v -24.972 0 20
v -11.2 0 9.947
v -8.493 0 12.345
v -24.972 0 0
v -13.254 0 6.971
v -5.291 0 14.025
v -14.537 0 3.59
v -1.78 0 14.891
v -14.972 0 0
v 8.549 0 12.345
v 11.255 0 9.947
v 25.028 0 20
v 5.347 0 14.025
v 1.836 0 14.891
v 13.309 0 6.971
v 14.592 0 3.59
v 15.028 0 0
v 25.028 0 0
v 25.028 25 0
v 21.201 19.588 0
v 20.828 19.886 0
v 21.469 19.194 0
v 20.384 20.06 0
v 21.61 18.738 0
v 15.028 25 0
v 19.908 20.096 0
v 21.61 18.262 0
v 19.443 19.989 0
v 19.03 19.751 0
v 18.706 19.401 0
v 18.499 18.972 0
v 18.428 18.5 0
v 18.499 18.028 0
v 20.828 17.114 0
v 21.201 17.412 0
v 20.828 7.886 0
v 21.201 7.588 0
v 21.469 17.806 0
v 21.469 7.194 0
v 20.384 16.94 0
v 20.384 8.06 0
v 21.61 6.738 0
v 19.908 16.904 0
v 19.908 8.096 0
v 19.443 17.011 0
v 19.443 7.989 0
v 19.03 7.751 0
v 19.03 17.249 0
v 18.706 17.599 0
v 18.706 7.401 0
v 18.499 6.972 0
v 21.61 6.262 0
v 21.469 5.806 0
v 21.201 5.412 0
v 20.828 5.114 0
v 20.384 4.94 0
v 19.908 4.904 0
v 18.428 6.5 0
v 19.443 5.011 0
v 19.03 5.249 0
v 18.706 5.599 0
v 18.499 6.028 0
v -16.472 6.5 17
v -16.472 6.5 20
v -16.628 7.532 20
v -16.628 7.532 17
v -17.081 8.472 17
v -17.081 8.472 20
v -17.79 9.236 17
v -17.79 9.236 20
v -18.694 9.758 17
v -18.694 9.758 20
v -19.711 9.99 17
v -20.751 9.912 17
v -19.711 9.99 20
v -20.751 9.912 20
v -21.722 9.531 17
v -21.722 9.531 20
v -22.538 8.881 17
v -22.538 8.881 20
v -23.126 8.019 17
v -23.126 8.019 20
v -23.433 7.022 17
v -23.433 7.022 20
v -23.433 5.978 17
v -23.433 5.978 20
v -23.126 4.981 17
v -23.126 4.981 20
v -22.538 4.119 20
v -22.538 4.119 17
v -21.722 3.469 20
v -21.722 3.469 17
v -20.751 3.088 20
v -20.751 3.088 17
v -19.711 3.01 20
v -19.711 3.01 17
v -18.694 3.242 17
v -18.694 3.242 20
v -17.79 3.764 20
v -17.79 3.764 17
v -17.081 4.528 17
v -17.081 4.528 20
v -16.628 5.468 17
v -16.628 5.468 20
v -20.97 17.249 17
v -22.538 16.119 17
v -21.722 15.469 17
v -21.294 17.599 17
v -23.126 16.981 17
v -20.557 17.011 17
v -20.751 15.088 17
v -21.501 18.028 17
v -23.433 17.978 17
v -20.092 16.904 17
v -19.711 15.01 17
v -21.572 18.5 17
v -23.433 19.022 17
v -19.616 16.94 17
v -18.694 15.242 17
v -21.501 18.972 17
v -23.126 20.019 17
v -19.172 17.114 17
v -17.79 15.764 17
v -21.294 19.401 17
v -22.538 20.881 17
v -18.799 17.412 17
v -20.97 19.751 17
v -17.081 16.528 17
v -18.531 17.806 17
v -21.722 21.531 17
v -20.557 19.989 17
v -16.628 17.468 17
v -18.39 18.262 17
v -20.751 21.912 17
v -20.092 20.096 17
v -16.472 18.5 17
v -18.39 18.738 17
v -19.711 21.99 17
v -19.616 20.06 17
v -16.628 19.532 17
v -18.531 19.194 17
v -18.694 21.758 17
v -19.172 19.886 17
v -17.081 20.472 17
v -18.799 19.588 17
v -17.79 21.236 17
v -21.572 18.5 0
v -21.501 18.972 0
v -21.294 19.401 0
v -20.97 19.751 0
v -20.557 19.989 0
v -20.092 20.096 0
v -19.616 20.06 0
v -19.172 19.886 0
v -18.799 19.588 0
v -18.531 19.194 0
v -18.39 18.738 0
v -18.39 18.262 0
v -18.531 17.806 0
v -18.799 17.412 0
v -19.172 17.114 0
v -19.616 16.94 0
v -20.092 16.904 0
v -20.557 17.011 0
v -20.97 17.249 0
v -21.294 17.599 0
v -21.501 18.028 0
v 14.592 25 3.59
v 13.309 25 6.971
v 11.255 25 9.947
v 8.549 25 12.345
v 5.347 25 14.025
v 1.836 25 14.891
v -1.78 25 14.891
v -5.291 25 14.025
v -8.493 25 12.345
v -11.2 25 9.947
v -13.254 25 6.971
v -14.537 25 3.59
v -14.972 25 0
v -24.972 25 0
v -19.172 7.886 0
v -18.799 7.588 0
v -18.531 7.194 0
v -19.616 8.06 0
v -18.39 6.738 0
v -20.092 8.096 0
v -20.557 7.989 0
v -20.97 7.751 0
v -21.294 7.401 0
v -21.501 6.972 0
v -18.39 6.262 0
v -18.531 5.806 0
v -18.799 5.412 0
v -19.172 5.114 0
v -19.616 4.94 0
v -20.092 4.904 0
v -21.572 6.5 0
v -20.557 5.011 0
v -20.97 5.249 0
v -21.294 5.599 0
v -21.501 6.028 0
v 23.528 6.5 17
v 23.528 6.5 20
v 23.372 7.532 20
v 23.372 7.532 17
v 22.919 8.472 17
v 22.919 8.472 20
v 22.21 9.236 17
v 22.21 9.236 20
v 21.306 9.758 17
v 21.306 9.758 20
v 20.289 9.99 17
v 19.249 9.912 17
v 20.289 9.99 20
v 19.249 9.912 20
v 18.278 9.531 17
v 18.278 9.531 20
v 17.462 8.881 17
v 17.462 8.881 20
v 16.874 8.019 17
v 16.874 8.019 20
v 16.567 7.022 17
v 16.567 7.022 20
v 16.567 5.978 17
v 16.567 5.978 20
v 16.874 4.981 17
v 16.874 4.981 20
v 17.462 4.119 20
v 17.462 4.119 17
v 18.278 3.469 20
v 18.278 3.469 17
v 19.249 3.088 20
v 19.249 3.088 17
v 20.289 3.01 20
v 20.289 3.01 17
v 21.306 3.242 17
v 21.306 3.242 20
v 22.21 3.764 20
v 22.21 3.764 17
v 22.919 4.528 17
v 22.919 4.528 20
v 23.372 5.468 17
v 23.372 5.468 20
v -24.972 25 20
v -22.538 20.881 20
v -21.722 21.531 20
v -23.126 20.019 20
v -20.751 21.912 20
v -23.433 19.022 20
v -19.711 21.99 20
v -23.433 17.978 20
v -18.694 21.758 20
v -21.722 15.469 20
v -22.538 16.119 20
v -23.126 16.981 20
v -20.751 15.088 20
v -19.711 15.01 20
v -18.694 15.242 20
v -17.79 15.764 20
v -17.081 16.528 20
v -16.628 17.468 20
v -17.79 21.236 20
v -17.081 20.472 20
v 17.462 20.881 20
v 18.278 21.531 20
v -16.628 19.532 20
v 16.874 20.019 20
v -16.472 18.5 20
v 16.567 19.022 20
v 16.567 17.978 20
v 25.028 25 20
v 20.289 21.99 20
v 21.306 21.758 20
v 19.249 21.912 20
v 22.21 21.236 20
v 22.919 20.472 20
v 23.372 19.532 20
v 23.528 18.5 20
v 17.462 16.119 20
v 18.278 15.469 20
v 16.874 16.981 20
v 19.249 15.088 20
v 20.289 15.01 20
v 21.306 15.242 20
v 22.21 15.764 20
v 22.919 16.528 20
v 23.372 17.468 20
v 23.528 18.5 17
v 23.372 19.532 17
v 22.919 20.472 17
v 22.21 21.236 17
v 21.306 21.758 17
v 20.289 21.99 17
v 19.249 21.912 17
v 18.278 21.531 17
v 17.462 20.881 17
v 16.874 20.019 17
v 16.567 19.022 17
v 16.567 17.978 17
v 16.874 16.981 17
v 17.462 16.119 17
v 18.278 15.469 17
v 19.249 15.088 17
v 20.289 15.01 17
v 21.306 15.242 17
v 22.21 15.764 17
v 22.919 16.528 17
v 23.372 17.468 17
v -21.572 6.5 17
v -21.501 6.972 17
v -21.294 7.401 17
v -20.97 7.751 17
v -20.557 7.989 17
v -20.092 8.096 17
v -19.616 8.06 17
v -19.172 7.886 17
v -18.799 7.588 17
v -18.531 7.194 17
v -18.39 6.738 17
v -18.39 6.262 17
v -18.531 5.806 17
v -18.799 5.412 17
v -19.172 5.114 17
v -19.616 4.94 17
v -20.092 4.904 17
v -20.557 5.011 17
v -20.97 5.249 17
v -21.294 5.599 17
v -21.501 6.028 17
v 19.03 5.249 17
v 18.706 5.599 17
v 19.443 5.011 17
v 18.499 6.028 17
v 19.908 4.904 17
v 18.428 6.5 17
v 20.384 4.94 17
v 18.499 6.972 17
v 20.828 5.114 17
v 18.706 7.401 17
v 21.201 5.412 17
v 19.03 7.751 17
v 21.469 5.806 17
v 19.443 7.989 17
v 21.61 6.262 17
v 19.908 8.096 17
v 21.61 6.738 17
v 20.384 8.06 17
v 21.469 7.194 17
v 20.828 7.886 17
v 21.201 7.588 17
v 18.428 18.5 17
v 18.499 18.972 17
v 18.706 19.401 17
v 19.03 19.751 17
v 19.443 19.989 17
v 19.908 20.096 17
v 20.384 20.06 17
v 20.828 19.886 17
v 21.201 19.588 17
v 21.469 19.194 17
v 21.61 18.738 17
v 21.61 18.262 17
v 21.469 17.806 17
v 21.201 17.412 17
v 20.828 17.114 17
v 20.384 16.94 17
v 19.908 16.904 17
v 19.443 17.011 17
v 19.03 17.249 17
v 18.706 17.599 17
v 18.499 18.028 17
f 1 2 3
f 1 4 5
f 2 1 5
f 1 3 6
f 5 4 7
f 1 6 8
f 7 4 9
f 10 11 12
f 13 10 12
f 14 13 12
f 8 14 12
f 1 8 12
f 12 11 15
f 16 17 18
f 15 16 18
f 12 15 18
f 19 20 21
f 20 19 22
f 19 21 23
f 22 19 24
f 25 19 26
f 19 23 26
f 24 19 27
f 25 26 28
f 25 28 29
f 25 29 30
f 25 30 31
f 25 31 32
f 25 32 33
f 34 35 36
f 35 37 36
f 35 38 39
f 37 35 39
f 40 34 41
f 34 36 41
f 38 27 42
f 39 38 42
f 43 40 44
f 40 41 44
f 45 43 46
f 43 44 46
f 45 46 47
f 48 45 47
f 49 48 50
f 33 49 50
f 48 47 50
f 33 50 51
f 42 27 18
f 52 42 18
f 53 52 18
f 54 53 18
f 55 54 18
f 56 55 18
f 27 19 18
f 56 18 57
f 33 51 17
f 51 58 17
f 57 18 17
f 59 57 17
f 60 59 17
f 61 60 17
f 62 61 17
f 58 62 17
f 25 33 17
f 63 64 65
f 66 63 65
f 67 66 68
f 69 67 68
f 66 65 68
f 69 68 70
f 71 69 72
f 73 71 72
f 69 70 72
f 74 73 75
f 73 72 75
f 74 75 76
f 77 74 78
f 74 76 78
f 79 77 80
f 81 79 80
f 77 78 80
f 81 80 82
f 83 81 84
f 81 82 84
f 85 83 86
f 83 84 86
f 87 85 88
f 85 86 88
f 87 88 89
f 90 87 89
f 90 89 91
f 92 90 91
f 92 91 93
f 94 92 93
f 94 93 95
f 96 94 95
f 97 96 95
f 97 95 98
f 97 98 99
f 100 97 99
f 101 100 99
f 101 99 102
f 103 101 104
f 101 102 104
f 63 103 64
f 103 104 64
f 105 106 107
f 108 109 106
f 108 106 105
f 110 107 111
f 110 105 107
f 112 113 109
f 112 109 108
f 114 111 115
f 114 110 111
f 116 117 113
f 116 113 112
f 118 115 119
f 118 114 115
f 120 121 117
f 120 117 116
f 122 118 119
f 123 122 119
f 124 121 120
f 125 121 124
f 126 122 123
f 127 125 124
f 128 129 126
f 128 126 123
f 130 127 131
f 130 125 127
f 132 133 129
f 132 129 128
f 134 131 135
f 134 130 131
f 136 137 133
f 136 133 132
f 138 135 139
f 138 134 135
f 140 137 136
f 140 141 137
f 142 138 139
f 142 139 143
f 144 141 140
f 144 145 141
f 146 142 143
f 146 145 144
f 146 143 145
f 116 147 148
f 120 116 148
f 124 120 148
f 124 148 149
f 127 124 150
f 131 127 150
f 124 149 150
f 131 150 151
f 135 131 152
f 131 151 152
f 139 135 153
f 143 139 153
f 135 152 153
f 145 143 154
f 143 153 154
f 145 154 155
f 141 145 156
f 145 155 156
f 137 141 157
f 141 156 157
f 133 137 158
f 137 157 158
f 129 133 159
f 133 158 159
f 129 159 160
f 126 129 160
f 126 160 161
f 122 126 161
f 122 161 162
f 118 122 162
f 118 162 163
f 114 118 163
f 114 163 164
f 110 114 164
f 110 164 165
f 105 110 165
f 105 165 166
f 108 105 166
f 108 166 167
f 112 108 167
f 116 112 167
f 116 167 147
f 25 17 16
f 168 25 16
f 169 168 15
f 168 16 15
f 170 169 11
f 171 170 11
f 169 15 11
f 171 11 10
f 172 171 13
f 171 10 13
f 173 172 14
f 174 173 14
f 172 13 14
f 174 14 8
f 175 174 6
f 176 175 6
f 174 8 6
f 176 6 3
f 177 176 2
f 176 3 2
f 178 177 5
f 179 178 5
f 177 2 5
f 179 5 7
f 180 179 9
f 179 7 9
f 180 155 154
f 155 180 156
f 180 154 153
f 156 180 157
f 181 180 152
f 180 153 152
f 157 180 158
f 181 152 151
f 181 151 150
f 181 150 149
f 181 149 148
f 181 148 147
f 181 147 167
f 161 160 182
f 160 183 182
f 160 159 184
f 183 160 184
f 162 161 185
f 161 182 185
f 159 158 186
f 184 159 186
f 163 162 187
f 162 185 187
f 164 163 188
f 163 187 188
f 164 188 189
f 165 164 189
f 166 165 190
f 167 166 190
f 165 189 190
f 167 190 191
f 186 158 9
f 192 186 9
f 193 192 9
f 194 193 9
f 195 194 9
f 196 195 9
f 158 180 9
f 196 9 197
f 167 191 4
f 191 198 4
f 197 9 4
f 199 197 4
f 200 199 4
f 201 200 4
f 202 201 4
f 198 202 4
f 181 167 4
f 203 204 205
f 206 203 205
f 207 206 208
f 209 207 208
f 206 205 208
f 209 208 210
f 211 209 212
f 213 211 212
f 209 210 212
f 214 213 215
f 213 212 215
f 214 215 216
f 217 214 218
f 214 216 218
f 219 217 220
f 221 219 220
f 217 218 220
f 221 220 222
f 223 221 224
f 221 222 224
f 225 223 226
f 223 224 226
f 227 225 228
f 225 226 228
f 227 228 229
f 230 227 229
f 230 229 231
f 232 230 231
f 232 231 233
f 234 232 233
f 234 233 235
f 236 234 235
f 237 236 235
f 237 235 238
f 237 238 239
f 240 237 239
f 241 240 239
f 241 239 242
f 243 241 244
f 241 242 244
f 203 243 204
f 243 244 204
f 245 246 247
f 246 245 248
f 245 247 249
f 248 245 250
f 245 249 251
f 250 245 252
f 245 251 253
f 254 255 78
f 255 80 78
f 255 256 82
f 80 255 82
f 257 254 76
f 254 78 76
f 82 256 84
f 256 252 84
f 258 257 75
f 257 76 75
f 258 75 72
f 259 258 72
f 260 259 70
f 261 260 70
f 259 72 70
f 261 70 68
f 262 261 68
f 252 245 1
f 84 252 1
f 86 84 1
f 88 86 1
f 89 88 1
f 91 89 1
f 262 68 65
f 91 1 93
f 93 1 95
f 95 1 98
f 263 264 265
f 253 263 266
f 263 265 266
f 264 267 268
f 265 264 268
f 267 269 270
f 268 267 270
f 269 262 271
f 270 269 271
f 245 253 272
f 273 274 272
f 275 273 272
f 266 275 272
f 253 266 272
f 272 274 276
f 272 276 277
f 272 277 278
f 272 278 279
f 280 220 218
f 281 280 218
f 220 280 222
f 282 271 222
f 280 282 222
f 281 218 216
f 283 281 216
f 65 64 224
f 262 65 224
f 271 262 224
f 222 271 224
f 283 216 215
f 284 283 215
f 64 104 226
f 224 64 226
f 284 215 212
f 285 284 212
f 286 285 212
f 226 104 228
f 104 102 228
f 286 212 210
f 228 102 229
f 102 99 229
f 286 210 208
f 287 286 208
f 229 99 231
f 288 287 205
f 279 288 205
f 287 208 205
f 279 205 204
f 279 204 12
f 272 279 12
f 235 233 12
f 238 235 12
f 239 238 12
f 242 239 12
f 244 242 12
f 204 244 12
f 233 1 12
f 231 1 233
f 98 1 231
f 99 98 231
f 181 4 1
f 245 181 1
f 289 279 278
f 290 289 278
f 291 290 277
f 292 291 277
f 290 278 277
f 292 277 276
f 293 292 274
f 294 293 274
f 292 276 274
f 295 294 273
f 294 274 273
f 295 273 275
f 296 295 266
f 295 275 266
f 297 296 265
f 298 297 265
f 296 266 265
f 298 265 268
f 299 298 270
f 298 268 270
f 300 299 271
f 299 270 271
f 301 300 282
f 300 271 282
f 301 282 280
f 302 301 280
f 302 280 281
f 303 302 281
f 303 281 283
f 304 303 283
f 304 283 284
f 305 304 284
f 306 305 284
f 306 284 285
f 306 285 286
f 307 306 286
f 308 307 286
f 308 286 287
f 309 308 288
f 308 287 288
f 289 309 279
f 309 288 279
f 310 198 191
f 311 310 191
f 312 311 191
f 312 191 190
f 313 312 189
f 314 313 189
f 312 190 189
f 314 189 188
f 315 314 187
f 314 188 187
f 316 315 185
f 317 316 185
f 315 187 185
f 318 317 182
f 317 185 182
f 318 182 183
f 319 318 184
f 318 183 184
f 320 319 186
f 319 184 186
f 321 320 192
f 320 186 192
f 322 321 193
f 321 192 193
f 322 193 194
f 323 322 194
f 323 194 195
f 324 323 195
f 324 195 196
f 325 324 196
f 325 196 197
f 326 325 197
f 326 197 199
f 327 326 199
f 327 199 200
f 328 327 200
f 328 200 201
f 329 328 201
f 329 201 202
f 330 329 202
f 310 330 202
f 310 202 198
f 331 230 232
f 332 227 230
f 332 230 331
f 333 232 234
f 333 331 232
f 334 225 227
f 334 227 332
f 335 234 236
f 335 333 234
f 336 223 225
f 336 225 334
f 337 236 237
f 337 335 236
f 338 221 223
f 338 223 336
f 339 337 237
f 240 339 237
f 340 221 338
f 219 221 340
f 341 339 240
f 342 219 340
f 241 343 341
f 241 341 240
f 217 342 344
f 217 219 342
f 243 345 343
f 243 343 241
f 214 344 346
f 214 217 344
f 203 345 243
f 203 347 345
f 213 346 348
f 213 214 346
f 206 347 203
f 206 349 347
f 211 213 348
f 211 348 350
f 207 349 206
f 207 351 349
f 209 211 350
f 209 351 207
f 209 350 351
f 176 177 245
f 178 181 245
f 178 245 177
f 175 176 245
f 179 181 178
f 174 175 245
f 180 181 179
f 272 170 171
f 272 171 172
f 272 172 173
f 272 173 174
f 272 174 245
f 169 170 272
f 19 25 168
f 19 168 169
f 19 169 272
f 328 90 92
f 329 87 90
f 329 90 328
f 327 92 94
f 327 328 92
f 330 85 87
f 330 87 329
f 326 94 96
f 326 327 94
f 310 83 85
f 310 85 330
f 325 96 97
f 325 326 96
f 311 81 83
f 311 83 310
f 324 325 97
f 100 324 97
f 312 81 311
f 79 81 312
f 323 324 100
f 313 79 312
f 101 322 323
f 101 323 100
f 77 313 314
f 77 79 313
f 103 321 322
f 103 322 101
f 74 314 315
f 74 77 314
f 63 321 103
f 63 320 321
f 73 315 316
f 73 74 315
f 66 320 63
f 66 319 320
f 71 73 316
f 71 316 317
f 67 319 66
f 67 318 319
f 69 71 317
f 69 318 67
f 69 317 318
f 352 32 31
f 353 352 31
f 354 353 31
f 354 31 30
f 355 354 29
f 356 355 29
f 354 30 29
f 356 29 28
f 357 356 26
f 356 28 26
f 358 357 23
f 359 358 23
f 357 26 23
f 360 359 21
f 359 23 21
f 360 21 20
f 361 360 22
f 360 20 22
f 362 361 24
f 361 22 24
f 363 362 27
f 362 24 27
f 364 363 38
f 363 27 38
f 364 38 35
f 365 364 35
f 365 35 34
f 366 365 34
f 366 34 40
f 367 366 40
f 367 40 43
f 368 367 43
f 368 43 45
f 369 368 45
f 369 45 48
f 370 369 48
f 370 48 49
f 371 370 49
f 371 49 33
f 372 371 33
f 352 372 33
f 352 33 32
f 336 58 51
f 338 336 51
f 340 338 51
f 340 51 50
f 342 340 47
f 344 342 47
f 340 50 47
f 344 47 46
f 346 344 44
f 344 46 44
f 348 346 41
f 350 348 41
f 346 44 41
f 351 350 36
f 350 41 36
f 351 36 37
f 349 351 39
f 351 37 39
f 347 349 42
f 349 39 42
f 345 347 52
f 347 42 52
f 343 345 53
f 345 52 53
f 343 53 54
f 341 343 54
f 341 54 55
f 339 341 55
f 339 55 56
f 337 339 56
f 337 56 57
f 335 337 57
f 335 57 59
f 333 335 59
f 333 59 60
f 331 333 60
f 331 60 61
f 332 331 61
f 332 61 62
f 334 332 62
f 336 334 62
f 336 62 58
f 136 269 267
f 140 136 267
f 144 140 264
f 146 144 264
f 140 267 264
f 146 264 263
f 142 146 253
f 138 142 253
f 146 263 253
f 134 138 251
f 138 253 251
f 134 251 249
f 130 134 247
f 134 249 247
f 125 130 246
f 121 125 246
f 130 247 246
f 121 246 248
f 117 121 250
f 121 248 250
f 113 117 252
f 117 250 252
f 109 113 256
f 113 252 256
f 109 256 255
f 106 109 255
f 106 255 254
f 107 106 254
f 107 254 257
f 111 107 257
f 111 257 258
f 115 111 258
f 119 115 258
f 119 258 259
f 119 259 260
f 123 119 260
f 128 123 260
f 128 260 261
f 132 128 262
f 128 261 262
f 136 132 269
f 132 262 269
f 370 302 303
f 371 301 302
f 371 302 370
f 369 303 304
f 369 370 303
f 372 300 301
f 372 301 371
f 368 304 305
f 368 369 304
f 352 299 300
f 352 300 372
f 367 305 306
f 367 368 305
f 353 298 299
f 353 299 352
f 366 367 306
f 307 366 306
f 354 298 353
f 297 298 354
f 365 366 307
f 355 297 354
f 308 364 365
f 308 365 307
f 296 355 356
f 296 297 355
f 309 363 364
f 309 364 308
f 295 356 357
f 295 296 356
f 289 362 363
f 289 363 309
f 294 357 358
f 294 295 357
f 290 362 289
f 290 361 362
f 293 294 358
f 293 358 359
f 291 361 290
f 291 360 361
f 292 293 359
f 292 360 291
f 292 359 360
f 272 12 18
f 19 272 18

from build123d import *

# Parameters (mm, degrees)
BOSS_EXTRUDE1_DEPTH = 25
SKETCH2_R           = 4
CUT_EXTRUDE1_DEPTH  = 31
SKETCH3_R           = 1.6
CUT_EXTRUDE2_DEPTH  = 46
SKETCH4_W           = 10
SKETCH4_H           = 25
CUT_EXTRUDE3_DEPTH  = 26
SKETCH5_R           = 3.5
CUT_EXTRUDE4_DEPTH  = 3


with BuildPart() as part:
    # Sketch1 → Boss-Extrude1 (new body)
    with BuildSketch(Plane(origin=(0, 0, 0), x_dir=(1, 0, 0), z_dir=(0, 1, 0))):
        with BuildLine():
            Line((-14.972375691, 0), (-24.972375691, 0))
            Line((-24.972375691, 0), (-24.972375691, -20))
            Line((-24.972375691, -20), (-4.972375691, -20))
            Line((-4.972375691, -20), (-4.972375691, -45))
            Line((-4.972375691, -45), (5.027624309, -45))
            Line((5.027624309, -45), (5.027624309, -20))
            Line((5.027624309, -20), (25.027624309, -20))
            Line((25.027624309, -20), (25.027624309, 0))
            Line((25.027624309, 0), (15.027624309, 0))
            ThreePointArc((15.027624309, 0), (0.027624309, -15), (-14.972375691, 0))
        make_face()
    extrude(amount=BOSS_EXTRUDE1_DEPTH)

    # Sketch2 → Cut-Extrude1 (cut, through all)
    with BuildSketch(Plane.ZY.offset(4.972375691)):
        with Locations((36, 12.5)):
            Circle(SKETCH2_R)
    extrude(amount=-CUT_EXTRUDE1_DEPTH, mode=Mode.SUBTRACT)

    # Sketch3 → Cut-Extrude2 (cut, through all)
    with BuildSketch(Plane(origin=(0, 0, 0), x_dir=(-1, 0, 0), z_dir=(0, 0, -1))):
        with Locations((-20.027624309, 6.5)):
            Circle(SKETCH3_R)
        with Locations((-20.027624309, 18.5)):
            Circle(SKETCH3_R)
        with Locations((19.972375691, 6.5)):
            Circle(SKETCH3_R)
        with Locations((19.972375691, 18.5)):
            Circle(SKETCH3_R)
    extrude(amount=-CUT_EXTRUDE2_DEPTH, mode=Mode.SUBTRACT)

    # Sketch4 → Cut-Extrude3 (cut, through all)
    with BuildSketch(Plane(origin=(0, 25, 0), x_dir=(1, 0, 0), z_dir=(0, 1, 0))):
        with Locations((0.027624309, -32.5)):
            Rectangle(SKETCH4_W, SKETCH4_H)
    extrude(amount=-CUT_EXTRUDE3_DEPTH, mode=Mode.SUBTRACT)

    # Sketch5 → Cut-Extrude4 (cut)
    with BuildSketch(Plane.XY.offset(20)):
        with Locations((20.027624309, 18.5)):
            Circle(SKETCH5_R)
        with Locations((20.027624309, 6.5)):
            Circle(SKETCH5_R)
        with Locations((-19.972375691, 6.5)):
            Circle(SKETCH5_R)
        with Locations((-19.972375691, 18.5)):
            Circle(SKETCH5_R)
    extrude(amount=-CUT_EXTRUDE4_DEPTH, mode=Mode.SUBTRACT)


solid = part.part
